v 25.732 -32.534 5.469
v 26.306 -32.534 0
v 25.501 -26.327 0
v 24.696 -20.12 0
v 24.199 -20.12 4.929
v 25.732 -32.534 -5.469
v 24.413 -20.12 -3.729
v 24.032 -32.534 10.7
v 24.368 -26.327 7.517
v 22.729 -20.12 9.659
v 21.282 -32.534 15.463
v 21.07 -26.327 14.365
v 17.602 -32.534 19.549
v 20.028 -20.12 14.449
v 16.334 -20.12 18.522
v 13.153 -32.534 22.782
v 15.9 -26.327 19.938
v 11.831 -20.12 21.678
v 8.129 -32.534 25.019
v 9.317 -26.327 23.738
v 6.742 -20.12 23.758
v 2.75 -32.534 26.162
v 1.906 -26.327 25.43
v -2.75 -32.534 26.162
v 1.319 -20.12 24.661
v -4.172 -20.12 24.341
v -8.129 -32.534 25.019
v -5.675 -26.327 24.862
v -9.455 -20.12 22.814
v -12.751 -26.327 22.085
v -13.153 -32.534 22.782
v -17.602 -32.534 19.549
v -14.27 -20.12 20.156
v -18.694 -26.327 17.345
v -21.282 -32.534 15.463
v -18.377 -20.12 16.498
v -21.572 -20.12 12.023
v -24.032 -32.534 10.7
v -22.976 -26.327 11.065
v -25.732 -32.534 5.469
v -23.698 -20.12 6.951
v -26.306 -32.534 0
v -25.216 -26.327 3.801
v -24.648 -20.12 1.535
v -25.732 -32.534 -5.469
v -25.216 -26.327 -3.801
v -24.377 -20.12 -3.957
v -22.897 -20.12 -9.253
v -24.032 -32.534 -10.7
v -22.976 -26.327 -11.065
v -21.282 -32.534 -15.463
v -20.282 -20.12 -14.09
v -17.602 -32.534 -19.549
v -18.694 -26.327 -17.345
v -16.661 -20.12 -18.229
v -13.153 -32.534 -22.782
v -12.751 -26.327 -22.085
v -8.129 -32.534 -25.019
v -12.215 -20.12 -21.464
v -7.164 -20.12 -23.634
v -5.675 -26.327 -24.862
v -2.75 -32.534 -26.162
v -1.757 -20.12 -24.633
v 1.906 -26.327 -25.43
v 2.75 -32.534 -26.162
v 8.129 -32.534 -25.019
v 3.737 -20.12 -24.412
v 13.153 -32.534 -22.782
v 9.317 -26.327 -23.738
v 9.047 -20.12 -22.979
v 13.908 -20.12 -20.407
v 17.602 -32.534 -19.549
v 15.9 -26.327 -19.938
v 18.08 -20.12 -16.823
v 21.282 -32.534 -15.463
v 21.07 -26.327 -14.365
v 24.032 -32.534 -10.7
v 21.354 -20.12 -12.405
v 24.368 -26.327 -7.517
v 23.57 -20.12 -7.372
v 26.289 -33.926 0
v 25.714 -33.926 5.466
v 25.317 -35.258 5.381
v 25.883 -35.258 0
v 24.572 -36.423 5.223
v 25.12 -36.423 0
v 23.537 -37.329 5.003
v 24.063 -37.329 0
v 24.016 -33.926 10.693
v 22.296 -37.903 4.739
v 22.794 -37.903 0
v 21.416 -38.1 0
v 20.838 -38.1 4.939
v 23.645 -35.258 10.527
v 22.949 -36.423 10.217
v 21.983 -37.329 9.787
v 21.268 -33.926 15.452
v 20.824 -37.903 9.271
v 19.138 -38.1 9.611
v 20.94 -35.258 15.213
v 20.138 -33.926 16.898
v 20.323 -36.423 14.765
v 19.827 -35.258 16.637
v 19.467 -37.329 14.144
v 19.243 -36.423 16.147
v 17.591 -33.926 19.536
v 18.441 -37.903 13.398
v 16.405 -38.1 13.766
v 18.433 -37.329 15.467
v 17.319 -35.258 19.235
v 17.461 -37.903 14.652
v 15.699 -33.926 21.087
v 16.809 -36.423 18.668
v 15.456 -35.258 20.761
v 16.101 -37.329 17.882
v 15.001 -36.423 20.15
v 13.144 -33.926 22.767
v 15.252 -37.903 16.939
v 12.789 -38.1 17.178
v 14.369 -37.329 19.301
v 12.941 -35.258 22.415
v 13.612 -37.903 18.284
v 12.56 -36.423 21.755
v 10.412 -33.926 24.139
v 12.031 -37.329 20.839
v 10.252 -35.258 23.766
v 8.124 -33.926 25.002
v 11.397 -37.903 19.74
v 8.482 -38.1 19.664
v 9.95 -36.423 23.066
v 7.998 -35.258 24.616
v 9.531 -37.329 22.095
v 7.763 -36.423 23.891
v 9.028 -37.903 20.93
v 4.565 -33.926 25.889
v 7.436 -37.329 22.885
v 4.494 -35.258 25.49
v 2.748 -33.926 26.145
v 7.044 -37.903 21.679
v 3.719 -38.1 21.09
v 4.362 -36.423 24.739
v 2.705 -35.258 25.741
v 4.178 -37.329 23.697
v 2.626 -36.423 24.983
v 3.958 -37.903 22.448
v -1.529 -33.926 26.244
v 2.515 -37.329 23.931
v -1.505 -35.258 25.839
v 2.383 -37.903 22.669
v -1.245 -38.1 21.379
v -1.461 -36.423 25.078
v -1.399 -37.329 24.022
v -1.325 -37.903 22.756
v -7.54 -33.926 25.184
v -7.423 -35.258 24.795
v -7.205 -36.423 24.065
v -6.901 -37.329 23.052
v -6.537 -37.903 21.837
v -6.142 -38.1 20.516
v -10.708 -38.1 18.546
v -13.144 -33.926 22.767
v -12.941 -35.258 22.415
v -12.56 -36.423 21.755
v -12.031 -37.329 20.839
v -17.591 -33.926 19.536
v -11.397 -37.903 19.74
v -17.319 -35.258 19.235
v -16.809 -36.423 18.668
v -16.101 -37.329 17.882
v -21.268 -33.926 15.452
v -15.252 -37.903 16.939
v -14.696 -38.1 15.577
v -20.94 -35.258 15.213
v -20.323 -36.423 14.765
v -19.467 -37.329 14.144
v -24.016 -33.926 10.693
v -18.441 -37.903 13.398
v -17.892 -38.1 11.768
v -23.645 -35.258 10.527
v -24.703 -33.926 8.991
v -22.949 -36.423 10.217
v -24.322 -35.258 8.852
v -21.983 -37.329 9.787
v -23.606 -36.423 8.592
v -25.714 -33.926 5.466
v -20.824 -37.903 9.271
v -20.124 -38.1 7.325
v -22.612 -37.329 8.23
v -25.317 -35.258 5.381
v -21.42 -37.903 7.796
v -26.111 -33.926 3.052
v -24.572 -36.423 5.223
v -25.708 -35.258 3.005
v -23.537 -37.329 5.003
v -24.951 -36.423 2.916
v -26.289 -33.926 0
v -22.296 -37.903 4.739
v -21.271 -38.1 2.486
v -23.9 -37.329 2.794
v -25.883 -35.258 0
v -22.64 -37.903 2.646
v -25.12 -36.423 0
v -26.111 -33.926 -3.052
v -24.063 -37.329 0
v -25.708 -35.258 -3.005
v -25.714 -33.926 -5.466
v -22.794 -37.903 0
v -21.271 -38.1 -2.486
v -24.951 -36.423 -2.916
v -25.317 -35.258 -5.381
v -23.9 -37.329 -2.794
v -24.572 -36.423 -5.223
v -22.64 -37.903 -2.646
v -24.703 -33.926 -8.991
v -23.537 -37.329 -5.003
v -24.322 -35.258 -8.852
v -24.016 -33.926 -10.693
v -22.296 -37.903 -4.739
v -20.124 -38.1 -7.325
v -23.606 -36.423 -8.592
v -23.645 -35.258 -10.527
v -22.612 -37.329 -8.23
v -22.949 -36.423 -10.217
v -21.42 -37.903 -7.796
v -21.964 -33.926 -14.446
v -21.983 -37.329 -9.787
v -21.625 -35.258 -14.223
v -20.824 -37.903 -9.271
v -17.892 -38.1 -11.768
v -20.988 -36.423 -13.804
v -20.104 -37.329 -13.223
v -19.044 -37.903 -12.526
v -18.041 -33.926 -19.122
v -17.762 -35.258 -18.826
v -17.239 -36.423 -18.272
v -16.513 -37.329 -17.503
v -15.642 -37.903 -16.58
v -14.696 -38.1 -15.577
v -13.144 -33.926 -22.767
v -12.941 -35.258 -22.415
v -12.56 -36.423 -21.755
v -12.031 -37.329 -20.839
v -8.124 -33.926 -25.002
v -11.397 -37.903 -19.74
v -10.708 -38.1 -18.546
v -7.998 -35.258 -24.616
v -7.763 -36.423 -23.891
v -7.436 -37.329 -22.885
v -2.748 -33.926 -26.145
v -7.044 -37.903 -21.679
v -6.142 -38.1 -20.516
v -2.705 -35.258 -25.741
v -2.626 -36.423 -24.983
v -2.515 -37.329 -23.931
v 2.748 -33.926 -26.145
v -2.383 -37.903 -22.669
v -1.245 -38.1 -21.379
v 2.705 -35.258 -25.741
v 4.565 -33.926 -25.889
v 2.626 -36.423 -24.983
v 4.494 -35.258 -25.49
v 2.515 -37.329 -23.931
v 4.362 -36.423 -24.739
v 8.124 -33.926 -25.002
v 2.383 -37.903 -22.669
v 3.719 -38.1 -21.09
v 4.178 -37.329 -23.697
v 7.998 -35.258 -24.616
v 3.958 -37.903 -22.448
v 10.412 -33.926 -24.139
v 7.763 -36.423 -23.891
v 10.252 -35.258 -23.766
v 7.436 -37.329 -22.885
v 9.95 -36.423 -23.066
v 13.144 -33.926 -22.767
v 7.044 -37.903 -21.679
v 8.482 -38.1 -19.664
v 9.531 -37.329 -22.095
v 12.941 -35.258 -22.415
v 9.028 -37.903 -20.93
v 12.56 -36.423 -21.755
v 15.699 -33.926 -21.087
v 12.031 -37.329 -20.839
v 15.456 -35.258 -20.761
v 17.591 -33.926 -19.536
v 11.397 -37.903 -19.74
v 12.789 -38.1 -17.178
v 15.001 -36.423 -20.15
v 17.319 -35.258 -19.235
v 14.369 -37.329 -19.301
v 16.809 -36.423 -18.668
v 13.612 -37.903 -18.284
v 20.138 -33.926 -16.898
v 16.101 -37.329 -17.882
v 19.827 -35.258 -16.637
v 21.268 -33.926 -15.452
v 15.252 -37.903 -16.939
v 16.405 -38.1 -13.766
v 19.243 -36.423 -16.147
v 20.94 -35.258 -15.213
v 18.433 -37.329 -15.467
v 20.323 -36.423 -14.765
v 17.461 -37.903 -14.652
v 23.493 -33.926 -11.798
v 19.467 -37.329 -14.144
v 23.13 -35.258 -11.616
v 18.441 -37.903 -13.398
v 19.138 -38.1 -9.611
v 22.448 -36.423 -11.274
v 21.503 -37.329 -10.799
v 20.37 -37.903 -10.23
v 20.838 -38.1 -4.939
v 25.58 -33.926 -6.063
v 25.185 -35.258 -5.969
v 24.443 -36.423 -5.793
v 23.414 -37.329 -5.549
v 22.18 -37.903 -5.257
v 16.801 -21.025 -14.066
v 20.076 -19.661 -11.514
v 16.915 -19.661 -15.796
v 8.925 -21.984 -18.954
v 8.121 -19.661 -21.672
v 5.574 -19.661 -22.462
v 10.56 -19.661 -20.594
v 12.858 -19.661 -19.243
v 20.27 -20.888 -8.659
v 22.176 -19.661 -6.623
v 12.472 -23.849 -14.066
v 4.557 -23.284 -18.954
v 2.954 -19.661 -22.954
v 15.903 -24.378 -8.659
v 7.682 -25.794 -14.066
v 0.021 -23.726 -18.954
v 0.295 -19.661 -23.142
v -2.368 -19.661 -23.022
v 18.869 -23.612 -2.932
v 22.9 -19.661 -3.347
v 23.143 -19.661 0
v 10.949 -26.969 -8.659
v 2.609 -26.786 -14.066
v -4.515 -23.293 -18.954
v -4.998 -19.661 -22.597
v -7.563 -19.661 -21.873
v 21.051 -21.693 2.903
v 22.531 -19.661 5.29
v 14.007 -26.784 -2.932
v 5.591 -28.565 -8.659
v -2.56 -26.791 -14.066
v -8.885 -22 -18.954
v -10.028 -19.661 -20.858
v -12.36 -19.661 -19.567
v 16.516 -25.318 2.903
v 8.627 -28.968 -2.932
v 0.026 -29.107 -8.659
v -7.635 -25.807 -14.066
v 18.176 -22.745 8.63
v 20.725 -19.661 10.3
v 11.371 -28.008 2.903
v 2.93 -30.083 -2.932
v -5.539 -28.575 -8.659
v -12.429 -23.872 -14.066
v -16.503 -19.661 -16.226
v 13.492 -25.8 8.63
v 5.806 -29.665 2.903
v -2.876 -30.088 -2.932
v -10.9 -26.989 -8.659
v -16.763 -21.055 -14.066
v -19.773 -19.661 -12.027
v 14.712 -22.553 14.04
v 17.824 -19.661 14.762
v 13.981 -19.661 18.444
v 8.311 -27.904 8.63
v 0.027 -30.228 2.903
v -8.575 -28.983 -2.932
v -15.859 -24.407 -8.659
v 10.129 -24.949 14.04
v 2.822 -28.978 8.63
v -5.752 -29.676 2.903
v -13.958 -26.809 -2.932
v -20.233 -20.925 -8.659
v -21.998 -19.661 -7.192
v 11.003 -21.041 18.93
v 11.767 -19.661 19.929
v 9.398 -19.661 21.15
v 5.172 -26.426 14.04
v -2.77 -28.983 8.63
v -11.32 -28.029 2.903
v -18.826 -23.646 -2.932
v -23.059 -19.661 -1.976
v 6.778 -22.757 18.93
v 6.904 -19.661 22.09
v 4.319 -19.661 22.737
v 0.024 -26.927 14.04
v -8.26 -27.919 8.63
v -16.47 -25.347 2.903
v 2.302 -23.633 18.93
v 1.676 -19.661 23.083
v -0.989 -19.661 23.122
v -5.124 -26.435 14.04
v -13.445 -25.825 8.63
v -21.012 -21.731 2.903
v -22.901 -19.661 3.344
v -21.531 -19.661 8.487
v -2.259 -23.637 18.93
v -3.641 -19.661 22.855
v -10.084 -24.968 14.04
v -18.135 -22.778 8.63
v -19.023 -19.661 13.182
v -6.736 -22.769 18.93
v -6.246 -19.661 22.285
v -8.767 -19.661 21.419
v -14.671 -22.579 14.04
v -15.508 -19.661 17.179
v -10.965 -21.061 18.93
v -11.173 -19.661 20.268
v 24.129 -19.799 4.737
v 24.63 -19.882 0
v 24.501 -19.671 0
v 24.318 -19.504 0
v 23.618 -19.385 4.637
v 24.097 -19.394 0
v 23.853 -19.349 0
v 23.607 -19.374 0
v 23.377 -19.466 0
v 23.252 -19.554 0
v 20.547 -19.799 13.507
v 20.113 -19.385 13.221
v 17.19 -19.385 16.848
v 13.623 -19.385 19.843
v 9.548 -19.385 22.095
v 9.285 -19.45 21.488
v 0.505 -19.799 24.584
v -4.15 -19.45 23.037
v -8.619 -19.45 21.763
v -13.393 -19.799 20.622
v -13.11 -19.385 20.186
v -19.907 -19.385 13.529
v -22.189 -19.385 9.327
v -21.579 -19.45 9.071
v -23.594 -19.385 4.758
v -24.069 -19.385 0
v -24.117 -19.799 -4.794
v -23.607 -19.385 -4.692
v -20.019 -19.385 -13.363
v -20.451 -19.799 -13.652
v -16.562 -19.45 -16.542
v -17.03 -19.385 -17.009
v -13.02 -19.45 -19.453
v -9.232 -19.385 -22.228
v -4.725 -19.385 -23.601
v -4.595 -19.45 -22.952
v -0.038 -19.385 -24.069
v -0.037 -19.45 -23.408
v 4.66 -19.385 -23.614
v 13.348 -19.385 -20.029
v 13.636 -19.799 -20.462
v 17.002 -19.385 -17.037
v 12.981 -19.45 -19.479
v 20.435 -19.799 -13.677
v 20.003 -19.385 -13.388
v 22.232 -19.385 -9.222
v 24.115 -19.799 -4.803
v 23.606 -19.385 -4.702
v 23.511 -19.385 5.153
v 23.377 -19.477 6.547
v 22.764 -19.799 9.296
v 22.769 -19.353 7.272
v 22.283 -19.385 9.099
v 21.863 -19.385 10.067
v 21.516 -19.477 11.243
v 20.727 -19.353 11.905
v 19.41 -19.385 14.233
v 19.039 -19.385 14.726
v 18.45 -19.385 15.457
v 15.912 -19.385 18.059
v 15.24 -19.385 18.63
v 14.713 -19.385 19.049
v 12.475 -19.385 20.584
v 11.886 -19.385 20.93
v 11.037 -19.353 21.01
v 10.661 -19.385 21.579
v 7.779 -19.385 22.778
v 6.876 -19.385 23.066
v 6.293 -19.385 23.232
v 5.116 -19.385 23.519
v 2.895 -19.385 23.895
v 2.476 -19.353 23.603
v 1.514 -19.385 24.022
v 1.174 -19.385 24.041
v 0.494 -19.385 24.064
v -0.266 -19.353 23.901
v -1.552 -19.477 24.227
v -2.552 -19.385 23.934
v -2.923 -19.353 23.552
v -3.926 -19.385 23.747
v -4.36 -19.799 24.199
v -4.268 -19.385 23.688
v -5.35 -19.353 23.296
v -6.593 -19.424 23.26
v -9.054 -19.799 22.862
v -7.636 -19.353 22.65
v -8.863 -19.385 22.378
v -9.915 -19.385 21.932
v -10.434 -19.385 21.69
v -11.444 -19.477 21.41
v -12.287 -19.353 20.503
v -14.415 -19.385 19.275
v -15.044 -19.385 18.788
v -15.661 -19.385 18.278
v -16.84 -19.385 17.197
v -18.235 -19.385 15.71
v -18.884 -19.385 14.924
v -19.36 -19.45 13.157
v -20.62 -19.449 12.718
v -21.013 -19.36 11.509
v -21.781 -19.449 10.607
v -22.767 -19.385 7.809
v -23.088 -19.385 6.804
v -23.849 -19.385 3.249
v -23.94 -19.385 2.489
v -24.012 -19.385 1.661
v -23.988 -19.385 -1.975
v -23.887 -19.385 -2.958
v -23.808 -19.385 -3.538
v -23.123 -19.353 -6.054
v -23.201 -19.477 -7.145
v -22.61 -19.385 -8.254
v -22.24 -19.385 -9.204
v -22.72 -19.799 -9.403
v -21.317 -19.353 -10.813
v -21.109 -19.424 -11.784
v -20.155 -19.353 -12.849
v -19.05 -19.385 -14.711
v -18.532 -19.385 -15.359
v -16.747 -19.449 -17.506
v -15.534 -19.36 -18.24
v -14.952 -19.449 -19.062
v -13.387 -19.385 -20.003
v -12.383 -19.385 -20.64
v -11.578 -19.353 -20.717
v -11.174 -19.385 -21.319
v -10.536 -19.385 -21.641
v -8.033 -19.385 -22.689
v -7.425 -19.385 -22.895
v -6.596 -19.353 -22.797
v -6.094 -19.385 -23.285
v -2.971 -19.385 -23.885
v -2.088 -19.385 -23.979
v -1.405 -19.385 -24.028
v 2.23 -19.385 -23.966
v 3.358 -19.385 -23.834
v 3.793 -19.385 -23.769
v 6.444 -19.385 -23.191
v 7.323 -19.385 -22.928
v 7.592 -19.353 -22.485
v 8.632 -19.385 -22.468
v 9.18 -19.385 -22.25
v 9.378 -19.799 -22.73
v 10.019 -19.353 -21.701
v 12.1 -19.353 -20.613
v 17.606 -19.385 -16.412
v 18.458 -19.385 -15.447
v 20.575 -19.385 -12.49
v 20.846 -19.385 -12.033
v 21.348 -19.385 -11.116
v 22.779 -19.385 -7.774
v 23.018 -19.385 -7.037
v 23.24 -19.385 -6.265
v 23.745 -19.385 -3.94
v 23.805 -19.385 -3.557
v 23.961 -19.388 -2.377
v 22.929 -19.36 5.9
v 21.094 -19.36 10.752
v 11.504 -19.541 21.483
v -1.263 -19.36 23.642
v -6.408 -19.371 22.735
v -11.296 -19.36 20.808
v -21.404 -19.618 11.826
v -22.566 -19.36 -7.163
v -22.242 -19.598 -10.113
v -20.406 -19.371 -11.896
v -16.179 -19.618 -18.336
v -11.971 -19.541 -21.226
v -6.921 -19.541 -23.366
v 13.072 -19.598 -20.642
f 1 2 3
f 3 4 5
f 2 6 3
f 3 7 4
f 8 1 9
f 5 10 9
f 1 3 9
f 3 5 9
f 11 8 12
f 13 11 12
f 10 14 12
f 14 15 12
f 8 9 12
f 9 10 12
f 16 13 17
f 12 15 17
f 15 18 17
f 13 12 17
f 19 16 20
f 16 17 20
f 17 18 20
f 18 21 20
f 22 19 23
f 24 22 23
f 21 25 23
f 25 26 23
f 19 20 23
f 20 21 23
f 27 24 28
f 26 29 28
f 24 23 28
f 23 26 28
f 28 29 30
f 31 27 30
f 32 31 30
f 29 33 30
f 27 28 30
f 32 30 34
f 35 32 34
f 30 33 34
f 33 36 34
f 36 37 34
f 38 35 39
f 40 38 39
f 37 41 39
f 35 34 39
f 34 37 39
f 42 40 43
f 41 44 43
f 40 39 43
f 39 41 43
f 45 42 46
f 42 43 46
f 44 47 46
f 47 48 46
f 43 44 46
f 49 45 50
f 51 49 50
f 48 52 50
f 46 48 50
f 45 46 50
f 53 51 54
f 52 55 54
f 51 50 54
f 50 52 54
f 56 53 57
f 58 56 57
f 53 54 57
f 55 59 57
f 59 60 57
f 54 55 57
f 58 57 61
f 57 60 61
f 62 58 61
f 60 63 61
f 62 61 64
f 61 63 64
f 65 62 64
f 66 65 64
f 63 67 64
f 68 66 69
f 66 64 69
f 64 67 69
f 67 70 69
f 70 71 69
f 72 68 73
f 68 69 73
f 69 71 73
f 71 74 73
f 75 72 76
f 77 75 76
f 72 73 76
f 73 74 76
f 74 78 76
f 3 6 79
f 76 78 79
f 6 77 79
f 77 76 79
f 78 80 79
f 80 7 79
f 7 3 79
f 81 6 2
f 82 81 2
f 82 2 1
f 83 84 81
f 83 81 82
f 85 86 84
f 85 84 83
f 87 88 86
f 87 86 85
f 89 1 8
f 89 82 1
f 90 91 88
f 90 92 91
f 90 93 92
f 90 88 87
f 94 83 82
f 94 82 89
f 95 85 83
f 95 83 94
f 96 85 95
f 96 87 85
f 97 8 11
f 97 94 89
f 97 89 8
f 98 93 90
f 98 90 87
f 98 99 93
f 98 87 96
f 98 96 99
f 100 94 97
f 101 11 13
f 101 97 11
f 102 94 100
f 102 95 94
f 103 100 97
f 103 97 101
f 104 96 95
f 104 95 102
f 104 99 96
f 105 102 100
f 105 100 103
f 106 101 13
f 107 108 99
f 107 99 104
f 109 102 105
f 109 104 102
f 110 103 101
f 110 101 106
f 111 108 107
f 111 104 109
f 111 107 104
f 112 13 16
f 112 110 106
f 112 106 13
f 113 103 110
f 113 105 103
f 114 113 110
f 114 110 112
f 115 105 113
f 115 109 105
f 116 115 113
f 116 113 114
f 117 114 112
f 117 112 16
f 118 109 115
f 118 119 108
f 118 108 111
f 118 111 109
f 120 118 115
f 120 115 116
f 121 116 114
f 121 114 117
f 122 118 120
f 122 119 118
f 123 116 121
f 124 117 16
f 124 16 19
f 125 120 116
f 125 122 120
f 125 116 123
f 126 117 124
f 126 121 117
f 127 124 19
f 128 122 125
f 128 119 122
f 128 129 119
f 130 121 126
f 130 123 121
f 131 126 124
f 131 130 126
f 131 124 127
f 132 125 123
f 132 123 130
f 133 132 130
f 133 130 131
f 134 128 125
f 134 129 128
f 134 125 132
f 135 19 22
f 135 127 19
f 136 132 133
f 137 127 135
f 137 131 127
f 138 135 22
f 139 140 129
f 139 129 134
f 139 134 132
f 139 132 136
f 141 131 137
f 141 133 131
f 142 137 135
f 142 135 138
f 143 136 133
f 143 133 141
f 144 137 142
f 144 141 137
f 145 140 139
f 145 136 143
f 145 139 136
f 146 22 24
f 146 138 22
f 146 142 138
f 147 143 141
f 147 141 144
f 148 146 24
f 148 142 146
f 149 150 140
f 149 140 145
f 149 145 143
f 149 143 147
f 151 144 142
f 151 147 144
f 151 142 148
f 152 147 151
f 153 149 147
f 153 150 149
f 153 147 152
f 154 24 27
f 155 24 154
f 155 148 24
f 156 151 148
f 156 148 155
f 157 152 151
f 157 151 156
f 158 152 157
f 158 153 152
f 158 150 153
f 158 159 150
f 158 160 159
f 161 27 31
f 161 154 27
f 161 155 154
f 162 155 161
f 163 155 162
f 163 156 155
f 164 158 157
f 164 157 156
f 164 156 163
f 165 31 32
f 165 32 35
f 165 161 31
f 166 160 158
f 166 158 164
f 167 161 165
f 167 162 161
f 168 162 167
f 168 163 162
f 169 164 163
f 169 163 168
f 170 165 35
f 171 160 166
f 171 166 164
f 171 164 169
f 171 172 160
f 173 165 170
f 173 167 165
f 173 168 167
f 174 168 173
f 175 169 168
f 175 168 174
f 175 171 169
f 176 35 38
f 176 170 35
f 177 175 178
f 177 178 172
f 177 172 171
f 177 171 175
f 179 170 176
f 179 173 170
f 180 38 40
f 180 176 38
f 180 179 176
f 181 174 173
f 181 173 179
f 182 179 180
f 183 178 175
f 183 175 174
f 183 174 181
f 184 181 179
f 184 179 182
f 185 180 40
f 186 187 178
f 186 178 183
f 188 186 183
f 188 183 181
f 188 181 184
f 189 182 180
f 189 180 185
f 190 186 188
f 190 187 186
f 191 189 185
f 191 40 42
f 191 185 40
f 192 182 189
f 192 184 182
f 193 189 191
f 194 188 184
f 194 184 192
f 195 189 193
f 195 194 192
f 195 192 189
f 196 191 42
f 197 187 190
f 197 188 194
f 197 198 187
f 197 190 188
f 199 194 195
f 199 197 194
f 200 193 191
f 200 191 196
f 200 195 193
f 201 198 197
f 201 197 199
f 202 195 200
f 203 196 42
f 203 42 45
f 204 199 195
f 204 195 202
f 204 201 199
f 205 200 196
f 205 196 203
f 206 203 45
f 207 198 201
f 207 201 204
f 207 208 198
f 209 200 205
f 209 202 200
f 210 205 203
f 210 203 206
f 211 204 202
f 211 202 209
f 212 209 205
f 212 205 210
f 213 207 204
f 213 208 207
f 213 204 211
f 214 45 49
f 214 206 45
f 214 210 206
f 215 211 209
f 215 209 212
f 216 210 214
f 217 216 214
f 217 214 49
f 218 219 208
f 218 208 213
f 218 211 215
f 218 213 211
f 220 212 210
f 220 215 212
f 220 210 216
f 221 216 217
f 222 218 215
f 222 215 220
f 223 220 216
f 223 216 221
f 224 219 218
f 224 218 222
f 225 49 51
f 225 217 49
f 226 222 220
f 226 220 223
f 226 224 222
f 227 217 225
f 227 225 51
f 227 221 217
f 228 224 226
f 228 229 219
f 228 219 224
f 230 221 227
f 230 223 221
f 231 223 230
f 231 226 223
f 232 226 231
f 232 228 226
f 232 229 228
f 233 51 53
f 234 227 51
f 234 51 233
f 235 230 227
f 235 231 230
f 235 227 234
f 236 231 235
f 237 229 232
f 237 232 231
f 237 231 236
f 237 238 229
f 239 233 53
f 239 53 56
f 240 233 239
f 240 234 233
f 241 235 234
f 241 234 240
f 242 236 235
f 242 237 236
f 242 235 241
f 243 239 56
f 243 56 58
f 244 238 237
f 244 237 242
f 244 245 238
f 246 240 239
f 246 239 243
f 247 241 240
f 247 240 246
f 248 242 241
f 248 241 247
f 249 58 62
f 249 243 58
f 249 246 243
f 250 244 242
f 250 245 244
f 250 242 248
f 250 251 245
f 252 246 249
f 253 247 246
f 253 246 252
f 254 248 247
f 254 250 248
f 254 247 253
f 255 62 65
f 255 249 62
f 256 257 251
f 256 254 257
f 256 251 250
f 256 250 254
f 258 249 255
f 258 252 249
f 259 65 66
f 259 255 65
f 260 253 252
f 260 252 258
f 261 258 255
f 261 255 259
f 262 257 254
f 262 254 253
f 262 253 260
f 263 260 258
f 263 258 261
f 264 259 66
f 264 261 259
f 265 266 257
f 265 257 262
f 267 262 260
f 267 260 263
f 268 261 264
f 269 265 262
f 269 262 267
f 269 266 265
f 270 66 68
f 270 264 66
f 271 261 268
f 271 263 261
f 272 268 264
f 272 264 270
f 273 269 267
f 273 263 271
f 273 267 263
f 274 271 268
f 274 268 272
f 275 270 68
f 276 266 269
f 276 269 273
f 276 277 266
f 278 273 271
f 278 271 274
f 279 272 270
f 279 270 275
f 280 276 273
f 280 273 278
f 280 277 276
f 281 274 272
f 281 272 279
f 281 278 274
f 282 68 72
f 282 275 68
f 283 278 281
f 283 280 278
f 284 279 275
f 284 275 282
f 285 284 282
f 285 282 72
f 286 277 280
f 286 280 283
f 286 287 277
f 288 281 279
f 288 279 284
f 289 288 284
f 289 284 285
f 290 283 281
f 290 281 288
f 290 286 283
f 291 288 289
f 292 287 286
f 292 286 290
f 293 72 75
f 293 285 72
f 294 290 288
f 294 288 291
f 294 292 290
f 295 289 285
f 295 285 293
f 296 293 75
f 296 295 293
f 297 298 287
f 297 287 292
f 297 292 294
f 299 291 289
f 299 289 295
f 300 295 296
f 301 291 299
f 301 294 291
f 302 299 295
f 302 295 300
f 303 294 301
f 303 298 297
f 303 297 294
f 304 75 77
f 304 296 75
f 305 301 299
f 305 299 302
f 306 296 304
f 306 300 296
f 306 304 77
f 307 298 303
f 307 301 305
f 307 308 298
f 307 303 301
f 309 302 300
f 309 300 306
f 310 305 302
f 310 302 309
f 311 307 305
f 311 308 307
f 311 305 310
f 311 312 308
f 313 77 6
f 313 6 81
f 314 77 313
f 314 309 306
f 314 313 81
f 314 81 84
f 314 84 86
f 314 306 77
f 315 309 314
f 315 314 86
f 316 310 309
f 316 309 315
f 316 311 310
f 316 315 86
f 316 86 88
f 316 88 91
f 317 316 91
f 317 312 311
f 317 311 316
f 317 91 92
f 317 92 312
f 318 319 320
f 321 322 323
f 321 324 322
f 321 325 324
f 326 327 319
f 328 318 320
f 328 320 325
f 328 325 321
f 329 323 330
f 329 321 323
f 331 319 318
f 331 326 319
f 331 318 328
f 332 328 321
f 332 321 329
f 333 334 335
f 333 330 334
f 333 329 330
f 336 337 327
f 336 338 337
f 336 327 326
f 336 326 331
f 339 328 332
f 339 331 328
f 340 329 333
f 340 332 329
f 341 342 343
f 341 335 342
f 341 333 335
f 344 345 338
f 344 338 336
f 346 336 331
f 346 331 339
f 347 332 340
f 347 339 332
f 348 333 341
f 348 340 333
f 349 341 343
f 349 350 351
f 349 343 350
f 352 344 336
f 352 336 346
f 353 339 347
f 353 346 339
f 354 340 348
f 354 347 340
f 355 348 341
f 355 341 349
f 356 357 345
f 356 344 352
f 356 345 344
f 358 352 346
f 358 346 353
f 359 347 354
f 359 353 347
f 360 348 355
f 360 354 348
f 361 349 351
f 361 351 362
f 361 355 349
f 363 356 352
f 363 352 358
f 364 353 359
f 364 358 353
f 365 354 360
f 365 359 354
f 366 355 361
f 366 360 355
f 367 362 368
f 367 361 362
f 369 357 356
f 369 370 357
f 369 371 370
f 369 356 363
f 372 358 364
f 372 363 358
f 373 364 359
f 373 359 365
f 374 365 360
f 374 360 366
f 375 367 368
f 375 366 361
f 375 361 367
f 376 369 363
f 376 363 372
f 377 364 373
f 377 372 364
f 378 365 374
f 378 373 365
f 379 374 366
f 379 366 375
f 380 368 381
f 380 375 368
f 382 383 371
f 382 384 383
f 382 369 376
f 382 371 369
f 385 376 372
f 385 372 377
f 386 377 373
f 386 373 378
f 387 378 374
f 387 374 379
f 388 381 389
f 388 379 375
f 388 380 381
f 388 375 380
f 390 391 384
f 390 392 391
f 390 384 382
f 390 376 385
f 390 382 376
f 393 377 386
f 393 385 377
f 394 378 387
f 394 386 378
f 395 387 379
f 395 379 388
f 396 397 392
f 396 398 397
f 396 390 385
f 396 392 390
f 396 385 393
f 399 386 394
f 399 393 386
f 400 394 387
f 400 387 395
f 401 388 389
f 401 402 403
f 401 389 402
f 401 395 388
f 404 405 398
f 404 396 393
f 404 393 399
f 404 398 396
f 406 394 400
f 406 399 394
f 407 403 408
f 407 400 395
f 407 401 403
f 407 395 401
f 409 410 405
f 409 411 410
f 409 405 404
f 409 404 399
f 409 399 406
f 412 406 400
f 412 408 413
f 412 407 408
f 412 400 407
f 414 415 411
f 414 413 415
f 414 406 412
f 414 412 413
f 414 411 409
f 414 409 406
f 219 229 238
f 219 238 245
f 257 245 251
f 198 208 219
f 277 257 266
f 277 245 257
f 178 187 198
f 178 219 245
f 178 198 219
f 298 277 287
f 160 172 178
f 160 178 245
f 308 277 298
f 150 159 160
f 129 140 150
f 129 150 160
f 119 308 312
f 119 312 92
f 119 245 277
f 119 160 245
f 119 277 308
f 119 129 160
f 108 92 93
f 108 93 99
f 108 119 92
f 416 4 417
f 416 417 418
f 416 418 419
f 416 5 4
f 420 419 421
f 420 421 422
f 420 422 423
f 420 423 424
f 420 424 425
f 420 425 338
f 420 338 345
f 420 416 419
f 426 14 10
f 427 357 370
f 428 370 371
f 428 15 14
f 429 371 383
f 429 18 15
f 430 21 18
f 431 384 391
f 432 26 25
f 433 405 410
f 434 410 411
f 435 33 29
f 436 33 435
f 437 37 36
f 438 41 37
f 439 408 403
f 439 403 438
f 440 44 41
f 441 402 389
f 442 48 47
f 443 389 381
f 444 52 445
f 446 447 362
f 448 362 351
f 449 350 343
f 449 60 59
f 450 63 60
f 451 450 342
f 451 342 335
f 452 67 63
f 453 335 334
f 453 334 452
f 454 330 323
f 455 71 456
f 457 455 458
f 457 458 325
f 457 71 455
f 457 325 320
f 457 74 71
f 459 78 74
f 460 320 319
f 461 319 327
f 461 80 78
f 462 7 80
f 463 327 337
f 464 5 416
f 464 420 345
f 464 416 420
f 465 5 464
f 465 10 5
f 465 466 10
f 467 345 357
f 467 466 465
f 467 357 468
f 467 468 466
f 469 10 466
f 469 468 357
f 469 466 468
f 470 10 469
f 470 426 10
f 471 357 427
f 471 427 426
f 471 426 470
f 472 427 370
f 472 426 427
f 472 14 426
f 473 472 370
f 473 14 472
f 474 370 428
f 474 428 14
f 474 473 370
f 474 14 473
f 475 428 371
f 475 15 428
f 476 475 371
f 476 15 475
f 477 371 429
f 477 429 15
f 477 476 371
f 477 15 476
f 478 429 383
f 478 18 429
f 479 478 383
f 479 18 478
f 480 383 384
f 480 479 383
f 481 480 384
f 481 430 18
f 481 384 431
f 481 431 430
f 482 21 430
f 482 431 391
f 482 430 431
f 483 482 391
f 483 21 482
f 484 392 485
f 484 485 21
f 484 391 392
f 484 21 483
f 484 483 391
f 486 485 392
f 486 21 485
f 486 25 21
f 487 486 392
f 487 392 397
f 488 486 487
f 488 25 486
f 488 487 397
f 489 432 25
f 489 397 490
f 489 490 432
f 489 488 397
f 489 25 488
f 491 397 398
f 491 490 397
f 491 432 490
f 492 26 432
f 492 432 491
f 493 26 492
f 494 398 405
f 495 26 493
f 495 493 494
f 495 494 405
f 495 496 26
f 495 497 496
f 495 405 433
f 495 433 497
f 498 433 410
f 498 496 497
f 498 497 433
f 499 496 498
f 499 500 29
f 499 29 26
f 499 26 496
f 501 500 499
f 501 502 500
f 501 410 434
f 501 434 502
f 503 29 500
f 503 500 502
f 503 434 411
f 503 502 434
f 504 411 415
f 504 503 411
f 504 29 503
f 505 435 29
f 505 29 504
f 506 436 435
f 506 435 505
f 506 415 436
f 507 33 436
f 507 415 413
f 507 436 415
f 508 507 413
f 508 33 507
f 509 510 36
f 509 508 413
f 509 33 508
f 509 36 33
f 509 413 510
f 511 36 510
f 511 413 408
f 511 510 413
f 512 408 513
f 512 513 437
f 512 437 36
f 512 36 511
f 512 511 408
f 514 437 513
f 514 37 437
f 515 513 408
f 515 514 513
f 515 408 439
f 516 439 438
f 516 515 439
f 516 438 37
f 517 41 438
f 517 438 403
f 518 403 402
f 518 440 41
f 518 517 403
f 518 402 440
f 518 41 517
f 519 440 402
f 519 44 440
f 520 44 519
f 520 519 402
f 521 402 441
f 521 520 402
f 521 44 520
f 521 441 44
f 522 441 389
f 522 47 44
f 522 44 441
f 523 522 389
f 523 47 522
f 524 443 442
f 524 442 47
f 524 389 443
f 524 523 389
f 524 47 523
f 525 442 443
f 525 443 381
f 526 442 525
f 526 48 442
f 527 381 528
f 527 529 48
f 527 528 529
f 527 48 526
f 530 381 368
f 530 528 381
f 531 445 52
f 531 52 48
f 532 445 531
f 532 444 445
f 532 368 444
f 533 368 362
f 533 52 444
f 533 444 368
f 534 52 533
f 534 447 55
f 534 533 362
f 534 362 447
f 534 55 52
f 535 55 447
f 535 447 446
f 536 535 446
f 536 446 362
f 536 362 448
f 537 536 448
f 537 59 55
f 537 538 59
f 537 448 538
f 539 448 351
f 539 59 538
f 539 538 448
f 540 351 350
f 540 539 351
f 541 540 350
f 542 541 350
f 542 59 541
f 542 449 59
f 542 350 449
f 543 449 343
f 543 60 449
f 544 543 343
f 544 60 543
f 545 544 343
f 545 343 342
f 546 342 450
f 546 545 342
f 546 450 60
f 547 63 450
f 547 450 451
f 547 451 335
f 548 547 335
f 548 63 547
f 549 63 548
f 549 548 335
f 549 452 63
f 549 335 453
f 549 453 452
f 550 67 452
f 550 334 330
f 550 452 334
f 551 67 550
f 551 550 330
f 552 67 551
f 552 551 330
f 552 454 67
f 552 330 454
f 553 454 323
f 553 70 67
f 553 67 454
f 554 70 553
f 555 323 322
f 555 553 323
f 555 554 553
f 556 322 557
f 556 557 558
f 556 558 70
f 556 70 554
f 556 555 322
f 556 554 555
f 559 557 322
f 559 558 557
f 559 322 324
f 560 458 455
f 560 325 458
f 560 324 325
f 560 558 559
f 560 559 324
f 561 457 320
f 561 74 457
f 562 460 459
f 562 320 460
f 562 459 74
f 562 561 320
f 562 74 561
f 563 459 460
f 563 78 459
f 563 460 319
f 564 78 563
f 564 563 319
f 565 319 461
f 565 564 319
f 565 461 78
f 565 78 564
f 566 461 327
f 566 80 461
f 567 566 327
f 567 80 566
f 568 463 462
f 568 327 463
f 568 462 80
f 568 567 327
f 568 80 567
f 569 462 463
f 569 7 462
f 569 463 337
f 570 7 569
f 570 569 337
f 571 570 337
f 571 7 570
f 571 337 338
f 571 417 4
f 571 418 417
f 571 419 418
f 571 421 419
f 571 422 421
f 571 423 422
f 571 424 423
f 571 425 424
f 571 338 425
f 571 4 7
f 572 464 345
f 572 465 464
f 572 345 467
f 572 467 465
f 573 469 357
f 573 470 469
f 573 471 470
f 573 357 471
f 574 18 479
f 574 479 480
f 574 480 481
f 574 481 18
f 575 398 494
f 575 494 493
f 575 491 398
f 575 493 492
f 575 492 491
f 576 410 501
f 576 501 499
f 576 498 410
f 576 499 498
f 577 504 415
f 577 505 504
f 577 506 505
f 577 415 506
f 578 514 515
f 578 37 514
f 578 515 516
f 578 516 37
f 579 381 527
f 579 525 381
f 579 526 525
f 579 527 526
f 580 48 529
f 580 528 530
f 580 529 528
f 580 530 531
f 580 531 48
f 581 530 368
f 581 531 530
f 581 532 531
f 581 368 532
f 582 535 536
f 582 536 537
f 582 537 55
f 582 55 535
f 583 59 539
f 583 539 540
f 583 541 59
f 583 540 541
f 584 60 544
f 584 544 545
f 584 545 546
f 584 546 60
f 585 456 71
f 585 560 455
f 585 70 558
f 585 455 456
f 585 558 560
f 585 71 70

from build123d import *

# Parameters (mm, degrees)
F4_R  = 27.0285687642
F2_R  = 22.0858176649
F9_R  = 0.8852297765
F10_R = 4.9318127202


# Not quite as in the source:
# - the program builds the solid bodies; features that only make, move or delete a surface that nothing else refers to are left out


with BuildPart() as f5:
    # F4 (on offset) → F5 section 0
    with BuildSketch(Plane.XZ.offset(38.1)):
        Circle(F4_R)
    # F2 (on Front) → F5 section 1
    with BuildSketch(Plane.XZ):
        Circle(F2_R)
    loft()


with BuildPart() as f7:
    # F6 (on Front) → F7 (revolve)
    with BuildSketch(Plane.XZ):
        with BuildLine():
            ThreePointArc((0, -30.3672800573), (30.3672800573, 0), (0, 30.3672800573))
            Line((0, 30.3672800573), (0, -30.3672800573))
        make_face()
    revolve(axis=Axis((0, 0, 0), (0, 0, -1)))


with BuildPart() as f5_1:
    add(f5.part)

    # F8: cut F7
    add(f7.part, mode=Mode.SUBTRACT)

    # F9
    f9_edges = [f5_1.edges().sort_by_distance(p)[0] for p in [
        (-24.426448, -18.042182, 0),
    ]]
    fillet(f9_edges, radius=F9_R)

    # F10
    f10_edges = [f5_1.edges().sort_by_distance(p)[0] for p in [
        (-27.028569, -38.1, 0),
    ]]
    fillet(f10_edges, radius=F10_R)


solid = f5_1.part
